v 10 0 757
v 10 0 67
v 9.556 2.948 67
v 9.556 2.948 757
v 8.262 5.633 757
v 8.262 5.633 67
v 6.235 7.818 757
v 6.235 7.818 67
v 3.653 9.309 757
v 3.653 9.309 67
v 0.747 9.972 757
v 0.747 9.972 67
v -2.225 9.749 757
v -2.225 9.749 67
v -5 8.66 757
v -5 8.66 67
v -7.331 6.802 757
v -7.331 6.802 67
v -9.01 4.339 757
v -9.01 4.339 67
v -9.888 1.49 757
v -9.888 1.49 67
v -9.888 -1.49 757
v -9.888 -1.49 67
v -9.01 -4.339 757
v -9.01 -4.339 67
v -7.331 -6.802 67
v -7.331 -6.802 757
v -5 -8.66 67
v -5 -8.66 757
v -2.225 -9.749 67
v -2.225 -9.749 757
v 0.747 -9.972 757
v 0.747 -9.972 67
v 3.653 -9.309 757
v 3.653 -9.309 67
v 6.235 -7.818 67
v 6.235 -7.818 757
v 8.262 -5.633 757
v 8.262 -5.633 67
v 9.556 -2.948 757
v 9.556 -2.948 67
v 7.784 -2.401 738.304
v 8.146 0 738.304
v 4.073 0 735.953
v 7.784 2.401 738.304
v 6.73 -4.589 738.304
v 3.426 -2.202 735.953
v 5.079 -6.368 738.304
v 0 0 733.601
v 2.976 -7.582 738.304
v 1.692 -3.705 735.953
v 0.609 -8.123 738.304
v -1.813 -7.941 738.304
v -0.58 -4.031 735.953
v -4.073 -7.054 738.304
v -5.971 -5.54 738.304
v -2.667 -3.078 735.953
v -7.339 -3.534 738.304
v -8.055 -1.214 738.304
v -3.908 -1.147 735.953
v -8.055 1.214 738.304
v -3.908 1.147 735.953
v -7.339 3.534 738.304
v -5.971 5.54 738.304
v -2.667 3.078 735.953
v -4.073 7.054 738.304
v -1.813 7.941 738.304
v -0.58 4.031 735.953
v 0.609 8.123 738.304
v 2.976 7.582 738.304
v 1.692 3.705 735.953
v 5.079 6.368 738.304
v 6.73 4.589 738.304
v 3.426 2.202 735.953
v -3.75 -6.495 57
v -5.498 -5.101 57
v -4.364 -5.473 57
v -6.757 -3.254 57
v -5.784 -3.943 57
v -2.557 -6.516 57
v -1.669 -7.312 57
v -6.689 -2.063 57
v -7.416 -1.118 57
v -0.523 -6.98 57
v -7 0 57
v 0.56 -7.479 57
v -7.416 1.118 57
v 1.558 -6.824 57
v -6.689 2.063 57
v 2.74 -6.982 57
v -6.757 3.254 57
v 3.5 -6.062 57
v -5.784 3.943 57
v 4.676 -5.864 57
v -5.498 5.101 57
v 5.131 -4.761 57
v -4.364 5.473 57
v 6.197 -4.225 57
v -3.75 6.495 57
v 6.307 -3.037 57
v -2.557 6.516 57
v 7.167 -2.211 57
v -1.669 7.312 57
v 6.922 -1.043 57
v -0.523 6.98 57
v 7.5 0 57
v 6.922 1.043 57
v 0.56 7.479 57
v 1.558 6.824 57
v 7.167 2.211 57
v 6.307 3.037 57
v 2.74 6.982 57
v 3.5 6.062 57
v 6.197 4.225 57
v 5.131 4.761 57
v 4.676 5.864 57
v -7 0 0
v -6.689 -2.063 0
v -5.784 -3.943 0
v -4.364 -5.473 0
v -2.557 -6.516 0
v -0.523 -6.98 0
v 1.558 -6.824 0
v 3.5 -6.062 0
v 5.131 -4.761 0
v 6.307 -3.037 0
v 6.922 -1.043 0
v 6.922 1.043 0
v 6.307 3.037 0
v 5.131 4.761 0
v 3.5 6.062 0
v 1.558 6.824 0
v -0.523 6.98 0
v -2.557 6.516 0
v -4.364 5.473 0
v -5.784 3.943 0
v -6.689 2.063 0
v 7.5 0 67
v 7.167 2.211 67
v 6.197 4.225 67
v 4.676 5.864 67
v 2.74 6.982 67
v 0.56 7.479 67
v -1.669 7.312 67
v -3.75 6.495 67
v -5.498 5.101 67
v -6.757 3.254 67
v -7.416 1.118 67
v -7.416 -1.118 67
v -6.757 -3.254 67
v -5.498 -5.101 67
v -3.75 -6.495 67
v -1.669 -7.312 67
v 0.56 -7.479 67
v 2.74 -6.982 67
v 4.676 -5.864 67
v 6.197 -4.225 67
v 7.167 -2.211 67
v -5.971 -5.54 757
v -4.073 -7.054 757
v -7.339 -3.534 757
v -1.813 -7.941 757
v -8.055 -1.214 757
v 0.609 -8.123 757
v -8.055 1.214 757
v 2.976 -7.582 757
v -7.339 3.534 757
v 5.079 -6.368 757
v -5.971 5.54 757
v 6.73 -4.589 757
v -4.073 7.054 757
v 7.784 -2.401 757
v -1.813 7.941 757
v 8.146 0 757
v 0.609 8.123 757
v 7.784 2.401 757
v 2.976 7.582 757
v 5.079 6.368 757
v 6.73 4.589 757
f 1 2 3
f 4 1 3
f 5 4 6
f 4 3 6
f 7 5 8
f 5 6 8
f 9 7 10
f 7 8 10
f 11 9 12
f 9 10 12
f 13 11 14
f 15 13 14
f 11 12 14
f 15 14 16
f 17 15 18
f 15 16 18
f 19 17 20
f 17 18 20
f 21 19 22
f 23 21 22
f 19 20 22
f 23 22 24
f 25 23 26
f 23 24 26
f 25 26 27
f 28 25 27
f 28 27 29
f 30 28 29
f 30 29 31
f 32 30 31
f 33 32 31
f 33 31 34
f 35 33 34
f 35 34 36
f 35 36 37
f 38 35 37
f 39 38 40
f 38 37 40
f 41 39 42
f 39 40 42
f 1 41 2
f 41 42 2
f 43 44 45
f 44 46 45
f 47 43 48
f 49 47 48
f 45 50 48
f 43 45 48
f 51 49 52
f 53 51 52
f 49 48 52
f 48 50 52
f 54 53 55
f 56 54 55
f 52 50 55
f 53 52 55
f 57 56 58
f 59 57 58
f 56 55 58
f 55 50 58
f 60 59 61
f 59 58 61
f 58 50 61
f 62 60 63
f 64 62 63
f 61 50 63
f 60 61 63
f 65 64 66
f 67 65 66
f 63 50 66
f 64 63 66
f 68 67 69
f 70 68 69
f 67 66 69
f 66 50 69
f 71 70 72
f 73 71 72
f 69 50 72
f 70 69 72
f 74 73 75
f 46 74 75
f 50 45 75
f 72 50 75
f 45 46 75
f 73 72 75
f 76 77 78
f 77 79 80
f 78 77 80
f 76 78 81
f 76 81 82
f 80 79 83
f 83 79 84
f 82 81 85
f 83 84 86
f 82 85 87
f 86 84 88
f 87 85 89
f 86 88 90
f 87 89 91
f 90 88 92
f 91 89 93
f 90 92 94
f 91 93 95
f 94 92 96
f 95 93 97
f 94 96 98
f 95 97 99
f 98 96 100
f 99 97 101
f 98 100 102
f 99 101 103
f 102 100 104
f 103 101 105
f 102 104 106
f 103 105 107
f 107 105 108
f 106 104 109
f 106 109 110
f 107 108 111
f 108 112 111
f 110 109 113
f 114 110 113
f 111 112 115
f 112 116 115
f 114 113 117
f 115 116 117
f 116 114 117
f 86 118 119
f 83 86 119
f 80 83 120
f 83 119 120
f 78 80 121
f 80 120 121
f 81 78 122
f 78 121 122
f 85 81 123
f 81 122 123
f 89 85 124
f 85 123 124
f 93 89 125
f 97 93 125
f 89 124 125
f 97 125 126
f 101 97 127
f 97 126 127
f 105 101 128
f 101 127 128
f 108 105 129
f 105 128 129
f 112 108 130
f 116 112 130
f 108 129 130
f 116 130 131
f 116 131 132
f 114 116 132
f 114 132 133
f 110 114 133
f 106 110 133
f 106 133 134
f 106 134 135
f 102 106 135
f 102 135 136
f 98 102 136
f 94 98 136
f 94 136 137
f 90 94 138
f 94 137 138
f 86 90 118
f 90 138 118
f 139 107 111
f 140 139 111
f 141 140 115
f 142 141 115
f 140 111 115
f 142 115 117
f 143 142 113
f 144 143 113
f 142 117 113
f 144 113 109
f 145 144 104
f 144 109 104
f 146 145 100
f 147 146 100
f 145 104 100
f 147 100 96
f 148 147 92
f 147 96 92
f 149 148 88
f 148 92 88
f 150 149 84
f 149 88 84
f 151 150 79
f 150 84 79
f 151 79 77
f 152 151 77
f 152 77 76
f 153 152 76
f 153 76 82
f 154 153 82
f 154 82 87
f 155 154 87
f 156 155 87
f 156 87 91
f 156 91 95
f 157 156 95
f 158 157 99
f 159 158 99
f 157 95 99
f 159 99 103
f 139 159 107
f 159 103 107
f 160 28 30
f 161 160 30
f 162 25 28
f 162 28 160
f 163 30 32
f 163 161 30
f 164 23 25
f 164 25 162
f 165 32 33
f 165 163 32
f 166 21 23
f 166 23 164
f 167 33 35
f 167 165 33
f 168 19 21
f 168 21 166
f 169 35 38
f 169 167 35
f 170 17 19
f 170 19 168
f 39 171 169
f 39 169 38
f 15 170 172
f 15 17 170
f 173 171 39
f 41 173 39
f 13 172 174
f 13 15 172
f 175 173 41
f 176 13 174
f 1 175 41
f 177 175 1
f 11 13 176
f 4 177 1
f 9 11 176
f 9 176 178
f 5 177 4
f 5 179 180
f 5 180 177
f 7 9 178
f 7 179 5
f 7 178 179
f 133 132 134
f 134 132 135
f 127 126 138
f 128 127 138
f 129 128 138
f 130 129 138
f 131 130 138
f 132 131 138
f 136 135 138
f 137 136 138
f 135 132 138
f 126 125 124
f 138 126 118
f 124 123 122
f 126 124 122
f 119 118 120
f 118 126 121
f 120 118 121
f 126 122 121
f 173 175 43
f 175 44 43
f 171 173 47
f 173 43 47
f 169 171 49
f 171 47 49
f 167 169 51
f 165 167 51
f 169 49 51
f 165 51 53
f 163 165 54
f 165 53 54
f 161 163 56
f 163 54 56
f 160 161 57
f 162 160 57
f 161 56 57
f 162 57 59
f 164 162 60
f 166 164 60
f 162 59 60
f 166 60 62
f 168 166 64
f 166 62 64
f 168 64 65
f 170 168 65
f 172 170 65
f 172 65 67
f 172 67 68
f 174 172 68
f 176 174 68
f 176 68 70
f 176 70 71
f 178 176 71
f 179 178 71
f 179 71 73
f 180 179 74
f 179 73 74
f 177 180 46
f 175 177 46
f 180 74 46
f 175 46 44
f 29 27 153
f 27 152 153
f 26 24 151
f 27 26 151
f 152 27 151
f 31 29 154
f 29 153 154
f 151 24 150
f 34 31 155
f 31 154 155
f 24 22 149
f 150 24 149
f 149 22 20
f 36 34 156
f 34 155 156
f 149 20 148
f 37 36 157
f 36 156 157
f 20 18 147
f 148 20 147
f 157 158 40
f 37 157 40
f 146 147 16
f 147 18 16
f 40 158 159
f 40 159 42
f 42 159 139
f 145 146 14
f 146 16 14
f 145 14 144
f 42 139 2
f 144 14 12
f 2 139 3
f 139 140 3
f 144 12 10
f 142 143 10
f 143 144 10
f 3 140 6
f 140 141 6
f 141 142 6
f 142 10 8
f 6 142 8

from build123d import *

# Parameters (mm, degrees)
SKETCH_1_R      = 7
EXTRUDE_1_DEPTH = 57
SKETCH_2_R      = 7.5
EXTRUDE_2_DEPTH = 10
SKETCH_3_R      = 10
EXTRUDE_3_DEPTH = 690


with BuildPart() as part:
    # 草图1 → 凸台-拉伸1 (new body)
    with BuildSketch(Plane.XY):
        with Locations(Location((0, 0, 0), (0, 0, 180))):
            Circle(SKETCH_1_R)
    extrude(amount=EXTRUDE_1_DEPTH)

    # 草图2 → 凸台-拉伸2 (add)
    with BuildSketch(Plane.XY.offset(57)):
        Circle(SKETCH_2_R)
    extrude(amount=EXTRUDE_2_DEPTH)

    # 草图3 → 凸台-拉伸3 (add)
    with BuildSketch(Plane.XY.offset(67)):
        Circle(SKETCH_3_R)
    extrude(amount=EXTRUDE_3_DEPTH)

    # 草图4 → 切除-旋转1 (revolve, cut)
    with BuildSketch(Plane(origin=(0, 0, 0), x_dir=(0, 0, -1), z_dir=(1, 0, 0)), mode=Mode.PRIVATE) as cut_revolve_1_sk:
        Polygon((-757, 0), (-757, 5), (-761.492335199, 8.145566971), (-738.304335199, 8.145566971), (-733.601489916, 0), align=None)
    revolve(cut_revolve_1_sk.sketch.rotate(Axis((0, 0, 772.39343623), (0, 0, -1)), 90), axis=Axis((0, 0, 772.39343623), (0, 0, -1)), mode=Mode.SUBTRACT)


solid = part.part
